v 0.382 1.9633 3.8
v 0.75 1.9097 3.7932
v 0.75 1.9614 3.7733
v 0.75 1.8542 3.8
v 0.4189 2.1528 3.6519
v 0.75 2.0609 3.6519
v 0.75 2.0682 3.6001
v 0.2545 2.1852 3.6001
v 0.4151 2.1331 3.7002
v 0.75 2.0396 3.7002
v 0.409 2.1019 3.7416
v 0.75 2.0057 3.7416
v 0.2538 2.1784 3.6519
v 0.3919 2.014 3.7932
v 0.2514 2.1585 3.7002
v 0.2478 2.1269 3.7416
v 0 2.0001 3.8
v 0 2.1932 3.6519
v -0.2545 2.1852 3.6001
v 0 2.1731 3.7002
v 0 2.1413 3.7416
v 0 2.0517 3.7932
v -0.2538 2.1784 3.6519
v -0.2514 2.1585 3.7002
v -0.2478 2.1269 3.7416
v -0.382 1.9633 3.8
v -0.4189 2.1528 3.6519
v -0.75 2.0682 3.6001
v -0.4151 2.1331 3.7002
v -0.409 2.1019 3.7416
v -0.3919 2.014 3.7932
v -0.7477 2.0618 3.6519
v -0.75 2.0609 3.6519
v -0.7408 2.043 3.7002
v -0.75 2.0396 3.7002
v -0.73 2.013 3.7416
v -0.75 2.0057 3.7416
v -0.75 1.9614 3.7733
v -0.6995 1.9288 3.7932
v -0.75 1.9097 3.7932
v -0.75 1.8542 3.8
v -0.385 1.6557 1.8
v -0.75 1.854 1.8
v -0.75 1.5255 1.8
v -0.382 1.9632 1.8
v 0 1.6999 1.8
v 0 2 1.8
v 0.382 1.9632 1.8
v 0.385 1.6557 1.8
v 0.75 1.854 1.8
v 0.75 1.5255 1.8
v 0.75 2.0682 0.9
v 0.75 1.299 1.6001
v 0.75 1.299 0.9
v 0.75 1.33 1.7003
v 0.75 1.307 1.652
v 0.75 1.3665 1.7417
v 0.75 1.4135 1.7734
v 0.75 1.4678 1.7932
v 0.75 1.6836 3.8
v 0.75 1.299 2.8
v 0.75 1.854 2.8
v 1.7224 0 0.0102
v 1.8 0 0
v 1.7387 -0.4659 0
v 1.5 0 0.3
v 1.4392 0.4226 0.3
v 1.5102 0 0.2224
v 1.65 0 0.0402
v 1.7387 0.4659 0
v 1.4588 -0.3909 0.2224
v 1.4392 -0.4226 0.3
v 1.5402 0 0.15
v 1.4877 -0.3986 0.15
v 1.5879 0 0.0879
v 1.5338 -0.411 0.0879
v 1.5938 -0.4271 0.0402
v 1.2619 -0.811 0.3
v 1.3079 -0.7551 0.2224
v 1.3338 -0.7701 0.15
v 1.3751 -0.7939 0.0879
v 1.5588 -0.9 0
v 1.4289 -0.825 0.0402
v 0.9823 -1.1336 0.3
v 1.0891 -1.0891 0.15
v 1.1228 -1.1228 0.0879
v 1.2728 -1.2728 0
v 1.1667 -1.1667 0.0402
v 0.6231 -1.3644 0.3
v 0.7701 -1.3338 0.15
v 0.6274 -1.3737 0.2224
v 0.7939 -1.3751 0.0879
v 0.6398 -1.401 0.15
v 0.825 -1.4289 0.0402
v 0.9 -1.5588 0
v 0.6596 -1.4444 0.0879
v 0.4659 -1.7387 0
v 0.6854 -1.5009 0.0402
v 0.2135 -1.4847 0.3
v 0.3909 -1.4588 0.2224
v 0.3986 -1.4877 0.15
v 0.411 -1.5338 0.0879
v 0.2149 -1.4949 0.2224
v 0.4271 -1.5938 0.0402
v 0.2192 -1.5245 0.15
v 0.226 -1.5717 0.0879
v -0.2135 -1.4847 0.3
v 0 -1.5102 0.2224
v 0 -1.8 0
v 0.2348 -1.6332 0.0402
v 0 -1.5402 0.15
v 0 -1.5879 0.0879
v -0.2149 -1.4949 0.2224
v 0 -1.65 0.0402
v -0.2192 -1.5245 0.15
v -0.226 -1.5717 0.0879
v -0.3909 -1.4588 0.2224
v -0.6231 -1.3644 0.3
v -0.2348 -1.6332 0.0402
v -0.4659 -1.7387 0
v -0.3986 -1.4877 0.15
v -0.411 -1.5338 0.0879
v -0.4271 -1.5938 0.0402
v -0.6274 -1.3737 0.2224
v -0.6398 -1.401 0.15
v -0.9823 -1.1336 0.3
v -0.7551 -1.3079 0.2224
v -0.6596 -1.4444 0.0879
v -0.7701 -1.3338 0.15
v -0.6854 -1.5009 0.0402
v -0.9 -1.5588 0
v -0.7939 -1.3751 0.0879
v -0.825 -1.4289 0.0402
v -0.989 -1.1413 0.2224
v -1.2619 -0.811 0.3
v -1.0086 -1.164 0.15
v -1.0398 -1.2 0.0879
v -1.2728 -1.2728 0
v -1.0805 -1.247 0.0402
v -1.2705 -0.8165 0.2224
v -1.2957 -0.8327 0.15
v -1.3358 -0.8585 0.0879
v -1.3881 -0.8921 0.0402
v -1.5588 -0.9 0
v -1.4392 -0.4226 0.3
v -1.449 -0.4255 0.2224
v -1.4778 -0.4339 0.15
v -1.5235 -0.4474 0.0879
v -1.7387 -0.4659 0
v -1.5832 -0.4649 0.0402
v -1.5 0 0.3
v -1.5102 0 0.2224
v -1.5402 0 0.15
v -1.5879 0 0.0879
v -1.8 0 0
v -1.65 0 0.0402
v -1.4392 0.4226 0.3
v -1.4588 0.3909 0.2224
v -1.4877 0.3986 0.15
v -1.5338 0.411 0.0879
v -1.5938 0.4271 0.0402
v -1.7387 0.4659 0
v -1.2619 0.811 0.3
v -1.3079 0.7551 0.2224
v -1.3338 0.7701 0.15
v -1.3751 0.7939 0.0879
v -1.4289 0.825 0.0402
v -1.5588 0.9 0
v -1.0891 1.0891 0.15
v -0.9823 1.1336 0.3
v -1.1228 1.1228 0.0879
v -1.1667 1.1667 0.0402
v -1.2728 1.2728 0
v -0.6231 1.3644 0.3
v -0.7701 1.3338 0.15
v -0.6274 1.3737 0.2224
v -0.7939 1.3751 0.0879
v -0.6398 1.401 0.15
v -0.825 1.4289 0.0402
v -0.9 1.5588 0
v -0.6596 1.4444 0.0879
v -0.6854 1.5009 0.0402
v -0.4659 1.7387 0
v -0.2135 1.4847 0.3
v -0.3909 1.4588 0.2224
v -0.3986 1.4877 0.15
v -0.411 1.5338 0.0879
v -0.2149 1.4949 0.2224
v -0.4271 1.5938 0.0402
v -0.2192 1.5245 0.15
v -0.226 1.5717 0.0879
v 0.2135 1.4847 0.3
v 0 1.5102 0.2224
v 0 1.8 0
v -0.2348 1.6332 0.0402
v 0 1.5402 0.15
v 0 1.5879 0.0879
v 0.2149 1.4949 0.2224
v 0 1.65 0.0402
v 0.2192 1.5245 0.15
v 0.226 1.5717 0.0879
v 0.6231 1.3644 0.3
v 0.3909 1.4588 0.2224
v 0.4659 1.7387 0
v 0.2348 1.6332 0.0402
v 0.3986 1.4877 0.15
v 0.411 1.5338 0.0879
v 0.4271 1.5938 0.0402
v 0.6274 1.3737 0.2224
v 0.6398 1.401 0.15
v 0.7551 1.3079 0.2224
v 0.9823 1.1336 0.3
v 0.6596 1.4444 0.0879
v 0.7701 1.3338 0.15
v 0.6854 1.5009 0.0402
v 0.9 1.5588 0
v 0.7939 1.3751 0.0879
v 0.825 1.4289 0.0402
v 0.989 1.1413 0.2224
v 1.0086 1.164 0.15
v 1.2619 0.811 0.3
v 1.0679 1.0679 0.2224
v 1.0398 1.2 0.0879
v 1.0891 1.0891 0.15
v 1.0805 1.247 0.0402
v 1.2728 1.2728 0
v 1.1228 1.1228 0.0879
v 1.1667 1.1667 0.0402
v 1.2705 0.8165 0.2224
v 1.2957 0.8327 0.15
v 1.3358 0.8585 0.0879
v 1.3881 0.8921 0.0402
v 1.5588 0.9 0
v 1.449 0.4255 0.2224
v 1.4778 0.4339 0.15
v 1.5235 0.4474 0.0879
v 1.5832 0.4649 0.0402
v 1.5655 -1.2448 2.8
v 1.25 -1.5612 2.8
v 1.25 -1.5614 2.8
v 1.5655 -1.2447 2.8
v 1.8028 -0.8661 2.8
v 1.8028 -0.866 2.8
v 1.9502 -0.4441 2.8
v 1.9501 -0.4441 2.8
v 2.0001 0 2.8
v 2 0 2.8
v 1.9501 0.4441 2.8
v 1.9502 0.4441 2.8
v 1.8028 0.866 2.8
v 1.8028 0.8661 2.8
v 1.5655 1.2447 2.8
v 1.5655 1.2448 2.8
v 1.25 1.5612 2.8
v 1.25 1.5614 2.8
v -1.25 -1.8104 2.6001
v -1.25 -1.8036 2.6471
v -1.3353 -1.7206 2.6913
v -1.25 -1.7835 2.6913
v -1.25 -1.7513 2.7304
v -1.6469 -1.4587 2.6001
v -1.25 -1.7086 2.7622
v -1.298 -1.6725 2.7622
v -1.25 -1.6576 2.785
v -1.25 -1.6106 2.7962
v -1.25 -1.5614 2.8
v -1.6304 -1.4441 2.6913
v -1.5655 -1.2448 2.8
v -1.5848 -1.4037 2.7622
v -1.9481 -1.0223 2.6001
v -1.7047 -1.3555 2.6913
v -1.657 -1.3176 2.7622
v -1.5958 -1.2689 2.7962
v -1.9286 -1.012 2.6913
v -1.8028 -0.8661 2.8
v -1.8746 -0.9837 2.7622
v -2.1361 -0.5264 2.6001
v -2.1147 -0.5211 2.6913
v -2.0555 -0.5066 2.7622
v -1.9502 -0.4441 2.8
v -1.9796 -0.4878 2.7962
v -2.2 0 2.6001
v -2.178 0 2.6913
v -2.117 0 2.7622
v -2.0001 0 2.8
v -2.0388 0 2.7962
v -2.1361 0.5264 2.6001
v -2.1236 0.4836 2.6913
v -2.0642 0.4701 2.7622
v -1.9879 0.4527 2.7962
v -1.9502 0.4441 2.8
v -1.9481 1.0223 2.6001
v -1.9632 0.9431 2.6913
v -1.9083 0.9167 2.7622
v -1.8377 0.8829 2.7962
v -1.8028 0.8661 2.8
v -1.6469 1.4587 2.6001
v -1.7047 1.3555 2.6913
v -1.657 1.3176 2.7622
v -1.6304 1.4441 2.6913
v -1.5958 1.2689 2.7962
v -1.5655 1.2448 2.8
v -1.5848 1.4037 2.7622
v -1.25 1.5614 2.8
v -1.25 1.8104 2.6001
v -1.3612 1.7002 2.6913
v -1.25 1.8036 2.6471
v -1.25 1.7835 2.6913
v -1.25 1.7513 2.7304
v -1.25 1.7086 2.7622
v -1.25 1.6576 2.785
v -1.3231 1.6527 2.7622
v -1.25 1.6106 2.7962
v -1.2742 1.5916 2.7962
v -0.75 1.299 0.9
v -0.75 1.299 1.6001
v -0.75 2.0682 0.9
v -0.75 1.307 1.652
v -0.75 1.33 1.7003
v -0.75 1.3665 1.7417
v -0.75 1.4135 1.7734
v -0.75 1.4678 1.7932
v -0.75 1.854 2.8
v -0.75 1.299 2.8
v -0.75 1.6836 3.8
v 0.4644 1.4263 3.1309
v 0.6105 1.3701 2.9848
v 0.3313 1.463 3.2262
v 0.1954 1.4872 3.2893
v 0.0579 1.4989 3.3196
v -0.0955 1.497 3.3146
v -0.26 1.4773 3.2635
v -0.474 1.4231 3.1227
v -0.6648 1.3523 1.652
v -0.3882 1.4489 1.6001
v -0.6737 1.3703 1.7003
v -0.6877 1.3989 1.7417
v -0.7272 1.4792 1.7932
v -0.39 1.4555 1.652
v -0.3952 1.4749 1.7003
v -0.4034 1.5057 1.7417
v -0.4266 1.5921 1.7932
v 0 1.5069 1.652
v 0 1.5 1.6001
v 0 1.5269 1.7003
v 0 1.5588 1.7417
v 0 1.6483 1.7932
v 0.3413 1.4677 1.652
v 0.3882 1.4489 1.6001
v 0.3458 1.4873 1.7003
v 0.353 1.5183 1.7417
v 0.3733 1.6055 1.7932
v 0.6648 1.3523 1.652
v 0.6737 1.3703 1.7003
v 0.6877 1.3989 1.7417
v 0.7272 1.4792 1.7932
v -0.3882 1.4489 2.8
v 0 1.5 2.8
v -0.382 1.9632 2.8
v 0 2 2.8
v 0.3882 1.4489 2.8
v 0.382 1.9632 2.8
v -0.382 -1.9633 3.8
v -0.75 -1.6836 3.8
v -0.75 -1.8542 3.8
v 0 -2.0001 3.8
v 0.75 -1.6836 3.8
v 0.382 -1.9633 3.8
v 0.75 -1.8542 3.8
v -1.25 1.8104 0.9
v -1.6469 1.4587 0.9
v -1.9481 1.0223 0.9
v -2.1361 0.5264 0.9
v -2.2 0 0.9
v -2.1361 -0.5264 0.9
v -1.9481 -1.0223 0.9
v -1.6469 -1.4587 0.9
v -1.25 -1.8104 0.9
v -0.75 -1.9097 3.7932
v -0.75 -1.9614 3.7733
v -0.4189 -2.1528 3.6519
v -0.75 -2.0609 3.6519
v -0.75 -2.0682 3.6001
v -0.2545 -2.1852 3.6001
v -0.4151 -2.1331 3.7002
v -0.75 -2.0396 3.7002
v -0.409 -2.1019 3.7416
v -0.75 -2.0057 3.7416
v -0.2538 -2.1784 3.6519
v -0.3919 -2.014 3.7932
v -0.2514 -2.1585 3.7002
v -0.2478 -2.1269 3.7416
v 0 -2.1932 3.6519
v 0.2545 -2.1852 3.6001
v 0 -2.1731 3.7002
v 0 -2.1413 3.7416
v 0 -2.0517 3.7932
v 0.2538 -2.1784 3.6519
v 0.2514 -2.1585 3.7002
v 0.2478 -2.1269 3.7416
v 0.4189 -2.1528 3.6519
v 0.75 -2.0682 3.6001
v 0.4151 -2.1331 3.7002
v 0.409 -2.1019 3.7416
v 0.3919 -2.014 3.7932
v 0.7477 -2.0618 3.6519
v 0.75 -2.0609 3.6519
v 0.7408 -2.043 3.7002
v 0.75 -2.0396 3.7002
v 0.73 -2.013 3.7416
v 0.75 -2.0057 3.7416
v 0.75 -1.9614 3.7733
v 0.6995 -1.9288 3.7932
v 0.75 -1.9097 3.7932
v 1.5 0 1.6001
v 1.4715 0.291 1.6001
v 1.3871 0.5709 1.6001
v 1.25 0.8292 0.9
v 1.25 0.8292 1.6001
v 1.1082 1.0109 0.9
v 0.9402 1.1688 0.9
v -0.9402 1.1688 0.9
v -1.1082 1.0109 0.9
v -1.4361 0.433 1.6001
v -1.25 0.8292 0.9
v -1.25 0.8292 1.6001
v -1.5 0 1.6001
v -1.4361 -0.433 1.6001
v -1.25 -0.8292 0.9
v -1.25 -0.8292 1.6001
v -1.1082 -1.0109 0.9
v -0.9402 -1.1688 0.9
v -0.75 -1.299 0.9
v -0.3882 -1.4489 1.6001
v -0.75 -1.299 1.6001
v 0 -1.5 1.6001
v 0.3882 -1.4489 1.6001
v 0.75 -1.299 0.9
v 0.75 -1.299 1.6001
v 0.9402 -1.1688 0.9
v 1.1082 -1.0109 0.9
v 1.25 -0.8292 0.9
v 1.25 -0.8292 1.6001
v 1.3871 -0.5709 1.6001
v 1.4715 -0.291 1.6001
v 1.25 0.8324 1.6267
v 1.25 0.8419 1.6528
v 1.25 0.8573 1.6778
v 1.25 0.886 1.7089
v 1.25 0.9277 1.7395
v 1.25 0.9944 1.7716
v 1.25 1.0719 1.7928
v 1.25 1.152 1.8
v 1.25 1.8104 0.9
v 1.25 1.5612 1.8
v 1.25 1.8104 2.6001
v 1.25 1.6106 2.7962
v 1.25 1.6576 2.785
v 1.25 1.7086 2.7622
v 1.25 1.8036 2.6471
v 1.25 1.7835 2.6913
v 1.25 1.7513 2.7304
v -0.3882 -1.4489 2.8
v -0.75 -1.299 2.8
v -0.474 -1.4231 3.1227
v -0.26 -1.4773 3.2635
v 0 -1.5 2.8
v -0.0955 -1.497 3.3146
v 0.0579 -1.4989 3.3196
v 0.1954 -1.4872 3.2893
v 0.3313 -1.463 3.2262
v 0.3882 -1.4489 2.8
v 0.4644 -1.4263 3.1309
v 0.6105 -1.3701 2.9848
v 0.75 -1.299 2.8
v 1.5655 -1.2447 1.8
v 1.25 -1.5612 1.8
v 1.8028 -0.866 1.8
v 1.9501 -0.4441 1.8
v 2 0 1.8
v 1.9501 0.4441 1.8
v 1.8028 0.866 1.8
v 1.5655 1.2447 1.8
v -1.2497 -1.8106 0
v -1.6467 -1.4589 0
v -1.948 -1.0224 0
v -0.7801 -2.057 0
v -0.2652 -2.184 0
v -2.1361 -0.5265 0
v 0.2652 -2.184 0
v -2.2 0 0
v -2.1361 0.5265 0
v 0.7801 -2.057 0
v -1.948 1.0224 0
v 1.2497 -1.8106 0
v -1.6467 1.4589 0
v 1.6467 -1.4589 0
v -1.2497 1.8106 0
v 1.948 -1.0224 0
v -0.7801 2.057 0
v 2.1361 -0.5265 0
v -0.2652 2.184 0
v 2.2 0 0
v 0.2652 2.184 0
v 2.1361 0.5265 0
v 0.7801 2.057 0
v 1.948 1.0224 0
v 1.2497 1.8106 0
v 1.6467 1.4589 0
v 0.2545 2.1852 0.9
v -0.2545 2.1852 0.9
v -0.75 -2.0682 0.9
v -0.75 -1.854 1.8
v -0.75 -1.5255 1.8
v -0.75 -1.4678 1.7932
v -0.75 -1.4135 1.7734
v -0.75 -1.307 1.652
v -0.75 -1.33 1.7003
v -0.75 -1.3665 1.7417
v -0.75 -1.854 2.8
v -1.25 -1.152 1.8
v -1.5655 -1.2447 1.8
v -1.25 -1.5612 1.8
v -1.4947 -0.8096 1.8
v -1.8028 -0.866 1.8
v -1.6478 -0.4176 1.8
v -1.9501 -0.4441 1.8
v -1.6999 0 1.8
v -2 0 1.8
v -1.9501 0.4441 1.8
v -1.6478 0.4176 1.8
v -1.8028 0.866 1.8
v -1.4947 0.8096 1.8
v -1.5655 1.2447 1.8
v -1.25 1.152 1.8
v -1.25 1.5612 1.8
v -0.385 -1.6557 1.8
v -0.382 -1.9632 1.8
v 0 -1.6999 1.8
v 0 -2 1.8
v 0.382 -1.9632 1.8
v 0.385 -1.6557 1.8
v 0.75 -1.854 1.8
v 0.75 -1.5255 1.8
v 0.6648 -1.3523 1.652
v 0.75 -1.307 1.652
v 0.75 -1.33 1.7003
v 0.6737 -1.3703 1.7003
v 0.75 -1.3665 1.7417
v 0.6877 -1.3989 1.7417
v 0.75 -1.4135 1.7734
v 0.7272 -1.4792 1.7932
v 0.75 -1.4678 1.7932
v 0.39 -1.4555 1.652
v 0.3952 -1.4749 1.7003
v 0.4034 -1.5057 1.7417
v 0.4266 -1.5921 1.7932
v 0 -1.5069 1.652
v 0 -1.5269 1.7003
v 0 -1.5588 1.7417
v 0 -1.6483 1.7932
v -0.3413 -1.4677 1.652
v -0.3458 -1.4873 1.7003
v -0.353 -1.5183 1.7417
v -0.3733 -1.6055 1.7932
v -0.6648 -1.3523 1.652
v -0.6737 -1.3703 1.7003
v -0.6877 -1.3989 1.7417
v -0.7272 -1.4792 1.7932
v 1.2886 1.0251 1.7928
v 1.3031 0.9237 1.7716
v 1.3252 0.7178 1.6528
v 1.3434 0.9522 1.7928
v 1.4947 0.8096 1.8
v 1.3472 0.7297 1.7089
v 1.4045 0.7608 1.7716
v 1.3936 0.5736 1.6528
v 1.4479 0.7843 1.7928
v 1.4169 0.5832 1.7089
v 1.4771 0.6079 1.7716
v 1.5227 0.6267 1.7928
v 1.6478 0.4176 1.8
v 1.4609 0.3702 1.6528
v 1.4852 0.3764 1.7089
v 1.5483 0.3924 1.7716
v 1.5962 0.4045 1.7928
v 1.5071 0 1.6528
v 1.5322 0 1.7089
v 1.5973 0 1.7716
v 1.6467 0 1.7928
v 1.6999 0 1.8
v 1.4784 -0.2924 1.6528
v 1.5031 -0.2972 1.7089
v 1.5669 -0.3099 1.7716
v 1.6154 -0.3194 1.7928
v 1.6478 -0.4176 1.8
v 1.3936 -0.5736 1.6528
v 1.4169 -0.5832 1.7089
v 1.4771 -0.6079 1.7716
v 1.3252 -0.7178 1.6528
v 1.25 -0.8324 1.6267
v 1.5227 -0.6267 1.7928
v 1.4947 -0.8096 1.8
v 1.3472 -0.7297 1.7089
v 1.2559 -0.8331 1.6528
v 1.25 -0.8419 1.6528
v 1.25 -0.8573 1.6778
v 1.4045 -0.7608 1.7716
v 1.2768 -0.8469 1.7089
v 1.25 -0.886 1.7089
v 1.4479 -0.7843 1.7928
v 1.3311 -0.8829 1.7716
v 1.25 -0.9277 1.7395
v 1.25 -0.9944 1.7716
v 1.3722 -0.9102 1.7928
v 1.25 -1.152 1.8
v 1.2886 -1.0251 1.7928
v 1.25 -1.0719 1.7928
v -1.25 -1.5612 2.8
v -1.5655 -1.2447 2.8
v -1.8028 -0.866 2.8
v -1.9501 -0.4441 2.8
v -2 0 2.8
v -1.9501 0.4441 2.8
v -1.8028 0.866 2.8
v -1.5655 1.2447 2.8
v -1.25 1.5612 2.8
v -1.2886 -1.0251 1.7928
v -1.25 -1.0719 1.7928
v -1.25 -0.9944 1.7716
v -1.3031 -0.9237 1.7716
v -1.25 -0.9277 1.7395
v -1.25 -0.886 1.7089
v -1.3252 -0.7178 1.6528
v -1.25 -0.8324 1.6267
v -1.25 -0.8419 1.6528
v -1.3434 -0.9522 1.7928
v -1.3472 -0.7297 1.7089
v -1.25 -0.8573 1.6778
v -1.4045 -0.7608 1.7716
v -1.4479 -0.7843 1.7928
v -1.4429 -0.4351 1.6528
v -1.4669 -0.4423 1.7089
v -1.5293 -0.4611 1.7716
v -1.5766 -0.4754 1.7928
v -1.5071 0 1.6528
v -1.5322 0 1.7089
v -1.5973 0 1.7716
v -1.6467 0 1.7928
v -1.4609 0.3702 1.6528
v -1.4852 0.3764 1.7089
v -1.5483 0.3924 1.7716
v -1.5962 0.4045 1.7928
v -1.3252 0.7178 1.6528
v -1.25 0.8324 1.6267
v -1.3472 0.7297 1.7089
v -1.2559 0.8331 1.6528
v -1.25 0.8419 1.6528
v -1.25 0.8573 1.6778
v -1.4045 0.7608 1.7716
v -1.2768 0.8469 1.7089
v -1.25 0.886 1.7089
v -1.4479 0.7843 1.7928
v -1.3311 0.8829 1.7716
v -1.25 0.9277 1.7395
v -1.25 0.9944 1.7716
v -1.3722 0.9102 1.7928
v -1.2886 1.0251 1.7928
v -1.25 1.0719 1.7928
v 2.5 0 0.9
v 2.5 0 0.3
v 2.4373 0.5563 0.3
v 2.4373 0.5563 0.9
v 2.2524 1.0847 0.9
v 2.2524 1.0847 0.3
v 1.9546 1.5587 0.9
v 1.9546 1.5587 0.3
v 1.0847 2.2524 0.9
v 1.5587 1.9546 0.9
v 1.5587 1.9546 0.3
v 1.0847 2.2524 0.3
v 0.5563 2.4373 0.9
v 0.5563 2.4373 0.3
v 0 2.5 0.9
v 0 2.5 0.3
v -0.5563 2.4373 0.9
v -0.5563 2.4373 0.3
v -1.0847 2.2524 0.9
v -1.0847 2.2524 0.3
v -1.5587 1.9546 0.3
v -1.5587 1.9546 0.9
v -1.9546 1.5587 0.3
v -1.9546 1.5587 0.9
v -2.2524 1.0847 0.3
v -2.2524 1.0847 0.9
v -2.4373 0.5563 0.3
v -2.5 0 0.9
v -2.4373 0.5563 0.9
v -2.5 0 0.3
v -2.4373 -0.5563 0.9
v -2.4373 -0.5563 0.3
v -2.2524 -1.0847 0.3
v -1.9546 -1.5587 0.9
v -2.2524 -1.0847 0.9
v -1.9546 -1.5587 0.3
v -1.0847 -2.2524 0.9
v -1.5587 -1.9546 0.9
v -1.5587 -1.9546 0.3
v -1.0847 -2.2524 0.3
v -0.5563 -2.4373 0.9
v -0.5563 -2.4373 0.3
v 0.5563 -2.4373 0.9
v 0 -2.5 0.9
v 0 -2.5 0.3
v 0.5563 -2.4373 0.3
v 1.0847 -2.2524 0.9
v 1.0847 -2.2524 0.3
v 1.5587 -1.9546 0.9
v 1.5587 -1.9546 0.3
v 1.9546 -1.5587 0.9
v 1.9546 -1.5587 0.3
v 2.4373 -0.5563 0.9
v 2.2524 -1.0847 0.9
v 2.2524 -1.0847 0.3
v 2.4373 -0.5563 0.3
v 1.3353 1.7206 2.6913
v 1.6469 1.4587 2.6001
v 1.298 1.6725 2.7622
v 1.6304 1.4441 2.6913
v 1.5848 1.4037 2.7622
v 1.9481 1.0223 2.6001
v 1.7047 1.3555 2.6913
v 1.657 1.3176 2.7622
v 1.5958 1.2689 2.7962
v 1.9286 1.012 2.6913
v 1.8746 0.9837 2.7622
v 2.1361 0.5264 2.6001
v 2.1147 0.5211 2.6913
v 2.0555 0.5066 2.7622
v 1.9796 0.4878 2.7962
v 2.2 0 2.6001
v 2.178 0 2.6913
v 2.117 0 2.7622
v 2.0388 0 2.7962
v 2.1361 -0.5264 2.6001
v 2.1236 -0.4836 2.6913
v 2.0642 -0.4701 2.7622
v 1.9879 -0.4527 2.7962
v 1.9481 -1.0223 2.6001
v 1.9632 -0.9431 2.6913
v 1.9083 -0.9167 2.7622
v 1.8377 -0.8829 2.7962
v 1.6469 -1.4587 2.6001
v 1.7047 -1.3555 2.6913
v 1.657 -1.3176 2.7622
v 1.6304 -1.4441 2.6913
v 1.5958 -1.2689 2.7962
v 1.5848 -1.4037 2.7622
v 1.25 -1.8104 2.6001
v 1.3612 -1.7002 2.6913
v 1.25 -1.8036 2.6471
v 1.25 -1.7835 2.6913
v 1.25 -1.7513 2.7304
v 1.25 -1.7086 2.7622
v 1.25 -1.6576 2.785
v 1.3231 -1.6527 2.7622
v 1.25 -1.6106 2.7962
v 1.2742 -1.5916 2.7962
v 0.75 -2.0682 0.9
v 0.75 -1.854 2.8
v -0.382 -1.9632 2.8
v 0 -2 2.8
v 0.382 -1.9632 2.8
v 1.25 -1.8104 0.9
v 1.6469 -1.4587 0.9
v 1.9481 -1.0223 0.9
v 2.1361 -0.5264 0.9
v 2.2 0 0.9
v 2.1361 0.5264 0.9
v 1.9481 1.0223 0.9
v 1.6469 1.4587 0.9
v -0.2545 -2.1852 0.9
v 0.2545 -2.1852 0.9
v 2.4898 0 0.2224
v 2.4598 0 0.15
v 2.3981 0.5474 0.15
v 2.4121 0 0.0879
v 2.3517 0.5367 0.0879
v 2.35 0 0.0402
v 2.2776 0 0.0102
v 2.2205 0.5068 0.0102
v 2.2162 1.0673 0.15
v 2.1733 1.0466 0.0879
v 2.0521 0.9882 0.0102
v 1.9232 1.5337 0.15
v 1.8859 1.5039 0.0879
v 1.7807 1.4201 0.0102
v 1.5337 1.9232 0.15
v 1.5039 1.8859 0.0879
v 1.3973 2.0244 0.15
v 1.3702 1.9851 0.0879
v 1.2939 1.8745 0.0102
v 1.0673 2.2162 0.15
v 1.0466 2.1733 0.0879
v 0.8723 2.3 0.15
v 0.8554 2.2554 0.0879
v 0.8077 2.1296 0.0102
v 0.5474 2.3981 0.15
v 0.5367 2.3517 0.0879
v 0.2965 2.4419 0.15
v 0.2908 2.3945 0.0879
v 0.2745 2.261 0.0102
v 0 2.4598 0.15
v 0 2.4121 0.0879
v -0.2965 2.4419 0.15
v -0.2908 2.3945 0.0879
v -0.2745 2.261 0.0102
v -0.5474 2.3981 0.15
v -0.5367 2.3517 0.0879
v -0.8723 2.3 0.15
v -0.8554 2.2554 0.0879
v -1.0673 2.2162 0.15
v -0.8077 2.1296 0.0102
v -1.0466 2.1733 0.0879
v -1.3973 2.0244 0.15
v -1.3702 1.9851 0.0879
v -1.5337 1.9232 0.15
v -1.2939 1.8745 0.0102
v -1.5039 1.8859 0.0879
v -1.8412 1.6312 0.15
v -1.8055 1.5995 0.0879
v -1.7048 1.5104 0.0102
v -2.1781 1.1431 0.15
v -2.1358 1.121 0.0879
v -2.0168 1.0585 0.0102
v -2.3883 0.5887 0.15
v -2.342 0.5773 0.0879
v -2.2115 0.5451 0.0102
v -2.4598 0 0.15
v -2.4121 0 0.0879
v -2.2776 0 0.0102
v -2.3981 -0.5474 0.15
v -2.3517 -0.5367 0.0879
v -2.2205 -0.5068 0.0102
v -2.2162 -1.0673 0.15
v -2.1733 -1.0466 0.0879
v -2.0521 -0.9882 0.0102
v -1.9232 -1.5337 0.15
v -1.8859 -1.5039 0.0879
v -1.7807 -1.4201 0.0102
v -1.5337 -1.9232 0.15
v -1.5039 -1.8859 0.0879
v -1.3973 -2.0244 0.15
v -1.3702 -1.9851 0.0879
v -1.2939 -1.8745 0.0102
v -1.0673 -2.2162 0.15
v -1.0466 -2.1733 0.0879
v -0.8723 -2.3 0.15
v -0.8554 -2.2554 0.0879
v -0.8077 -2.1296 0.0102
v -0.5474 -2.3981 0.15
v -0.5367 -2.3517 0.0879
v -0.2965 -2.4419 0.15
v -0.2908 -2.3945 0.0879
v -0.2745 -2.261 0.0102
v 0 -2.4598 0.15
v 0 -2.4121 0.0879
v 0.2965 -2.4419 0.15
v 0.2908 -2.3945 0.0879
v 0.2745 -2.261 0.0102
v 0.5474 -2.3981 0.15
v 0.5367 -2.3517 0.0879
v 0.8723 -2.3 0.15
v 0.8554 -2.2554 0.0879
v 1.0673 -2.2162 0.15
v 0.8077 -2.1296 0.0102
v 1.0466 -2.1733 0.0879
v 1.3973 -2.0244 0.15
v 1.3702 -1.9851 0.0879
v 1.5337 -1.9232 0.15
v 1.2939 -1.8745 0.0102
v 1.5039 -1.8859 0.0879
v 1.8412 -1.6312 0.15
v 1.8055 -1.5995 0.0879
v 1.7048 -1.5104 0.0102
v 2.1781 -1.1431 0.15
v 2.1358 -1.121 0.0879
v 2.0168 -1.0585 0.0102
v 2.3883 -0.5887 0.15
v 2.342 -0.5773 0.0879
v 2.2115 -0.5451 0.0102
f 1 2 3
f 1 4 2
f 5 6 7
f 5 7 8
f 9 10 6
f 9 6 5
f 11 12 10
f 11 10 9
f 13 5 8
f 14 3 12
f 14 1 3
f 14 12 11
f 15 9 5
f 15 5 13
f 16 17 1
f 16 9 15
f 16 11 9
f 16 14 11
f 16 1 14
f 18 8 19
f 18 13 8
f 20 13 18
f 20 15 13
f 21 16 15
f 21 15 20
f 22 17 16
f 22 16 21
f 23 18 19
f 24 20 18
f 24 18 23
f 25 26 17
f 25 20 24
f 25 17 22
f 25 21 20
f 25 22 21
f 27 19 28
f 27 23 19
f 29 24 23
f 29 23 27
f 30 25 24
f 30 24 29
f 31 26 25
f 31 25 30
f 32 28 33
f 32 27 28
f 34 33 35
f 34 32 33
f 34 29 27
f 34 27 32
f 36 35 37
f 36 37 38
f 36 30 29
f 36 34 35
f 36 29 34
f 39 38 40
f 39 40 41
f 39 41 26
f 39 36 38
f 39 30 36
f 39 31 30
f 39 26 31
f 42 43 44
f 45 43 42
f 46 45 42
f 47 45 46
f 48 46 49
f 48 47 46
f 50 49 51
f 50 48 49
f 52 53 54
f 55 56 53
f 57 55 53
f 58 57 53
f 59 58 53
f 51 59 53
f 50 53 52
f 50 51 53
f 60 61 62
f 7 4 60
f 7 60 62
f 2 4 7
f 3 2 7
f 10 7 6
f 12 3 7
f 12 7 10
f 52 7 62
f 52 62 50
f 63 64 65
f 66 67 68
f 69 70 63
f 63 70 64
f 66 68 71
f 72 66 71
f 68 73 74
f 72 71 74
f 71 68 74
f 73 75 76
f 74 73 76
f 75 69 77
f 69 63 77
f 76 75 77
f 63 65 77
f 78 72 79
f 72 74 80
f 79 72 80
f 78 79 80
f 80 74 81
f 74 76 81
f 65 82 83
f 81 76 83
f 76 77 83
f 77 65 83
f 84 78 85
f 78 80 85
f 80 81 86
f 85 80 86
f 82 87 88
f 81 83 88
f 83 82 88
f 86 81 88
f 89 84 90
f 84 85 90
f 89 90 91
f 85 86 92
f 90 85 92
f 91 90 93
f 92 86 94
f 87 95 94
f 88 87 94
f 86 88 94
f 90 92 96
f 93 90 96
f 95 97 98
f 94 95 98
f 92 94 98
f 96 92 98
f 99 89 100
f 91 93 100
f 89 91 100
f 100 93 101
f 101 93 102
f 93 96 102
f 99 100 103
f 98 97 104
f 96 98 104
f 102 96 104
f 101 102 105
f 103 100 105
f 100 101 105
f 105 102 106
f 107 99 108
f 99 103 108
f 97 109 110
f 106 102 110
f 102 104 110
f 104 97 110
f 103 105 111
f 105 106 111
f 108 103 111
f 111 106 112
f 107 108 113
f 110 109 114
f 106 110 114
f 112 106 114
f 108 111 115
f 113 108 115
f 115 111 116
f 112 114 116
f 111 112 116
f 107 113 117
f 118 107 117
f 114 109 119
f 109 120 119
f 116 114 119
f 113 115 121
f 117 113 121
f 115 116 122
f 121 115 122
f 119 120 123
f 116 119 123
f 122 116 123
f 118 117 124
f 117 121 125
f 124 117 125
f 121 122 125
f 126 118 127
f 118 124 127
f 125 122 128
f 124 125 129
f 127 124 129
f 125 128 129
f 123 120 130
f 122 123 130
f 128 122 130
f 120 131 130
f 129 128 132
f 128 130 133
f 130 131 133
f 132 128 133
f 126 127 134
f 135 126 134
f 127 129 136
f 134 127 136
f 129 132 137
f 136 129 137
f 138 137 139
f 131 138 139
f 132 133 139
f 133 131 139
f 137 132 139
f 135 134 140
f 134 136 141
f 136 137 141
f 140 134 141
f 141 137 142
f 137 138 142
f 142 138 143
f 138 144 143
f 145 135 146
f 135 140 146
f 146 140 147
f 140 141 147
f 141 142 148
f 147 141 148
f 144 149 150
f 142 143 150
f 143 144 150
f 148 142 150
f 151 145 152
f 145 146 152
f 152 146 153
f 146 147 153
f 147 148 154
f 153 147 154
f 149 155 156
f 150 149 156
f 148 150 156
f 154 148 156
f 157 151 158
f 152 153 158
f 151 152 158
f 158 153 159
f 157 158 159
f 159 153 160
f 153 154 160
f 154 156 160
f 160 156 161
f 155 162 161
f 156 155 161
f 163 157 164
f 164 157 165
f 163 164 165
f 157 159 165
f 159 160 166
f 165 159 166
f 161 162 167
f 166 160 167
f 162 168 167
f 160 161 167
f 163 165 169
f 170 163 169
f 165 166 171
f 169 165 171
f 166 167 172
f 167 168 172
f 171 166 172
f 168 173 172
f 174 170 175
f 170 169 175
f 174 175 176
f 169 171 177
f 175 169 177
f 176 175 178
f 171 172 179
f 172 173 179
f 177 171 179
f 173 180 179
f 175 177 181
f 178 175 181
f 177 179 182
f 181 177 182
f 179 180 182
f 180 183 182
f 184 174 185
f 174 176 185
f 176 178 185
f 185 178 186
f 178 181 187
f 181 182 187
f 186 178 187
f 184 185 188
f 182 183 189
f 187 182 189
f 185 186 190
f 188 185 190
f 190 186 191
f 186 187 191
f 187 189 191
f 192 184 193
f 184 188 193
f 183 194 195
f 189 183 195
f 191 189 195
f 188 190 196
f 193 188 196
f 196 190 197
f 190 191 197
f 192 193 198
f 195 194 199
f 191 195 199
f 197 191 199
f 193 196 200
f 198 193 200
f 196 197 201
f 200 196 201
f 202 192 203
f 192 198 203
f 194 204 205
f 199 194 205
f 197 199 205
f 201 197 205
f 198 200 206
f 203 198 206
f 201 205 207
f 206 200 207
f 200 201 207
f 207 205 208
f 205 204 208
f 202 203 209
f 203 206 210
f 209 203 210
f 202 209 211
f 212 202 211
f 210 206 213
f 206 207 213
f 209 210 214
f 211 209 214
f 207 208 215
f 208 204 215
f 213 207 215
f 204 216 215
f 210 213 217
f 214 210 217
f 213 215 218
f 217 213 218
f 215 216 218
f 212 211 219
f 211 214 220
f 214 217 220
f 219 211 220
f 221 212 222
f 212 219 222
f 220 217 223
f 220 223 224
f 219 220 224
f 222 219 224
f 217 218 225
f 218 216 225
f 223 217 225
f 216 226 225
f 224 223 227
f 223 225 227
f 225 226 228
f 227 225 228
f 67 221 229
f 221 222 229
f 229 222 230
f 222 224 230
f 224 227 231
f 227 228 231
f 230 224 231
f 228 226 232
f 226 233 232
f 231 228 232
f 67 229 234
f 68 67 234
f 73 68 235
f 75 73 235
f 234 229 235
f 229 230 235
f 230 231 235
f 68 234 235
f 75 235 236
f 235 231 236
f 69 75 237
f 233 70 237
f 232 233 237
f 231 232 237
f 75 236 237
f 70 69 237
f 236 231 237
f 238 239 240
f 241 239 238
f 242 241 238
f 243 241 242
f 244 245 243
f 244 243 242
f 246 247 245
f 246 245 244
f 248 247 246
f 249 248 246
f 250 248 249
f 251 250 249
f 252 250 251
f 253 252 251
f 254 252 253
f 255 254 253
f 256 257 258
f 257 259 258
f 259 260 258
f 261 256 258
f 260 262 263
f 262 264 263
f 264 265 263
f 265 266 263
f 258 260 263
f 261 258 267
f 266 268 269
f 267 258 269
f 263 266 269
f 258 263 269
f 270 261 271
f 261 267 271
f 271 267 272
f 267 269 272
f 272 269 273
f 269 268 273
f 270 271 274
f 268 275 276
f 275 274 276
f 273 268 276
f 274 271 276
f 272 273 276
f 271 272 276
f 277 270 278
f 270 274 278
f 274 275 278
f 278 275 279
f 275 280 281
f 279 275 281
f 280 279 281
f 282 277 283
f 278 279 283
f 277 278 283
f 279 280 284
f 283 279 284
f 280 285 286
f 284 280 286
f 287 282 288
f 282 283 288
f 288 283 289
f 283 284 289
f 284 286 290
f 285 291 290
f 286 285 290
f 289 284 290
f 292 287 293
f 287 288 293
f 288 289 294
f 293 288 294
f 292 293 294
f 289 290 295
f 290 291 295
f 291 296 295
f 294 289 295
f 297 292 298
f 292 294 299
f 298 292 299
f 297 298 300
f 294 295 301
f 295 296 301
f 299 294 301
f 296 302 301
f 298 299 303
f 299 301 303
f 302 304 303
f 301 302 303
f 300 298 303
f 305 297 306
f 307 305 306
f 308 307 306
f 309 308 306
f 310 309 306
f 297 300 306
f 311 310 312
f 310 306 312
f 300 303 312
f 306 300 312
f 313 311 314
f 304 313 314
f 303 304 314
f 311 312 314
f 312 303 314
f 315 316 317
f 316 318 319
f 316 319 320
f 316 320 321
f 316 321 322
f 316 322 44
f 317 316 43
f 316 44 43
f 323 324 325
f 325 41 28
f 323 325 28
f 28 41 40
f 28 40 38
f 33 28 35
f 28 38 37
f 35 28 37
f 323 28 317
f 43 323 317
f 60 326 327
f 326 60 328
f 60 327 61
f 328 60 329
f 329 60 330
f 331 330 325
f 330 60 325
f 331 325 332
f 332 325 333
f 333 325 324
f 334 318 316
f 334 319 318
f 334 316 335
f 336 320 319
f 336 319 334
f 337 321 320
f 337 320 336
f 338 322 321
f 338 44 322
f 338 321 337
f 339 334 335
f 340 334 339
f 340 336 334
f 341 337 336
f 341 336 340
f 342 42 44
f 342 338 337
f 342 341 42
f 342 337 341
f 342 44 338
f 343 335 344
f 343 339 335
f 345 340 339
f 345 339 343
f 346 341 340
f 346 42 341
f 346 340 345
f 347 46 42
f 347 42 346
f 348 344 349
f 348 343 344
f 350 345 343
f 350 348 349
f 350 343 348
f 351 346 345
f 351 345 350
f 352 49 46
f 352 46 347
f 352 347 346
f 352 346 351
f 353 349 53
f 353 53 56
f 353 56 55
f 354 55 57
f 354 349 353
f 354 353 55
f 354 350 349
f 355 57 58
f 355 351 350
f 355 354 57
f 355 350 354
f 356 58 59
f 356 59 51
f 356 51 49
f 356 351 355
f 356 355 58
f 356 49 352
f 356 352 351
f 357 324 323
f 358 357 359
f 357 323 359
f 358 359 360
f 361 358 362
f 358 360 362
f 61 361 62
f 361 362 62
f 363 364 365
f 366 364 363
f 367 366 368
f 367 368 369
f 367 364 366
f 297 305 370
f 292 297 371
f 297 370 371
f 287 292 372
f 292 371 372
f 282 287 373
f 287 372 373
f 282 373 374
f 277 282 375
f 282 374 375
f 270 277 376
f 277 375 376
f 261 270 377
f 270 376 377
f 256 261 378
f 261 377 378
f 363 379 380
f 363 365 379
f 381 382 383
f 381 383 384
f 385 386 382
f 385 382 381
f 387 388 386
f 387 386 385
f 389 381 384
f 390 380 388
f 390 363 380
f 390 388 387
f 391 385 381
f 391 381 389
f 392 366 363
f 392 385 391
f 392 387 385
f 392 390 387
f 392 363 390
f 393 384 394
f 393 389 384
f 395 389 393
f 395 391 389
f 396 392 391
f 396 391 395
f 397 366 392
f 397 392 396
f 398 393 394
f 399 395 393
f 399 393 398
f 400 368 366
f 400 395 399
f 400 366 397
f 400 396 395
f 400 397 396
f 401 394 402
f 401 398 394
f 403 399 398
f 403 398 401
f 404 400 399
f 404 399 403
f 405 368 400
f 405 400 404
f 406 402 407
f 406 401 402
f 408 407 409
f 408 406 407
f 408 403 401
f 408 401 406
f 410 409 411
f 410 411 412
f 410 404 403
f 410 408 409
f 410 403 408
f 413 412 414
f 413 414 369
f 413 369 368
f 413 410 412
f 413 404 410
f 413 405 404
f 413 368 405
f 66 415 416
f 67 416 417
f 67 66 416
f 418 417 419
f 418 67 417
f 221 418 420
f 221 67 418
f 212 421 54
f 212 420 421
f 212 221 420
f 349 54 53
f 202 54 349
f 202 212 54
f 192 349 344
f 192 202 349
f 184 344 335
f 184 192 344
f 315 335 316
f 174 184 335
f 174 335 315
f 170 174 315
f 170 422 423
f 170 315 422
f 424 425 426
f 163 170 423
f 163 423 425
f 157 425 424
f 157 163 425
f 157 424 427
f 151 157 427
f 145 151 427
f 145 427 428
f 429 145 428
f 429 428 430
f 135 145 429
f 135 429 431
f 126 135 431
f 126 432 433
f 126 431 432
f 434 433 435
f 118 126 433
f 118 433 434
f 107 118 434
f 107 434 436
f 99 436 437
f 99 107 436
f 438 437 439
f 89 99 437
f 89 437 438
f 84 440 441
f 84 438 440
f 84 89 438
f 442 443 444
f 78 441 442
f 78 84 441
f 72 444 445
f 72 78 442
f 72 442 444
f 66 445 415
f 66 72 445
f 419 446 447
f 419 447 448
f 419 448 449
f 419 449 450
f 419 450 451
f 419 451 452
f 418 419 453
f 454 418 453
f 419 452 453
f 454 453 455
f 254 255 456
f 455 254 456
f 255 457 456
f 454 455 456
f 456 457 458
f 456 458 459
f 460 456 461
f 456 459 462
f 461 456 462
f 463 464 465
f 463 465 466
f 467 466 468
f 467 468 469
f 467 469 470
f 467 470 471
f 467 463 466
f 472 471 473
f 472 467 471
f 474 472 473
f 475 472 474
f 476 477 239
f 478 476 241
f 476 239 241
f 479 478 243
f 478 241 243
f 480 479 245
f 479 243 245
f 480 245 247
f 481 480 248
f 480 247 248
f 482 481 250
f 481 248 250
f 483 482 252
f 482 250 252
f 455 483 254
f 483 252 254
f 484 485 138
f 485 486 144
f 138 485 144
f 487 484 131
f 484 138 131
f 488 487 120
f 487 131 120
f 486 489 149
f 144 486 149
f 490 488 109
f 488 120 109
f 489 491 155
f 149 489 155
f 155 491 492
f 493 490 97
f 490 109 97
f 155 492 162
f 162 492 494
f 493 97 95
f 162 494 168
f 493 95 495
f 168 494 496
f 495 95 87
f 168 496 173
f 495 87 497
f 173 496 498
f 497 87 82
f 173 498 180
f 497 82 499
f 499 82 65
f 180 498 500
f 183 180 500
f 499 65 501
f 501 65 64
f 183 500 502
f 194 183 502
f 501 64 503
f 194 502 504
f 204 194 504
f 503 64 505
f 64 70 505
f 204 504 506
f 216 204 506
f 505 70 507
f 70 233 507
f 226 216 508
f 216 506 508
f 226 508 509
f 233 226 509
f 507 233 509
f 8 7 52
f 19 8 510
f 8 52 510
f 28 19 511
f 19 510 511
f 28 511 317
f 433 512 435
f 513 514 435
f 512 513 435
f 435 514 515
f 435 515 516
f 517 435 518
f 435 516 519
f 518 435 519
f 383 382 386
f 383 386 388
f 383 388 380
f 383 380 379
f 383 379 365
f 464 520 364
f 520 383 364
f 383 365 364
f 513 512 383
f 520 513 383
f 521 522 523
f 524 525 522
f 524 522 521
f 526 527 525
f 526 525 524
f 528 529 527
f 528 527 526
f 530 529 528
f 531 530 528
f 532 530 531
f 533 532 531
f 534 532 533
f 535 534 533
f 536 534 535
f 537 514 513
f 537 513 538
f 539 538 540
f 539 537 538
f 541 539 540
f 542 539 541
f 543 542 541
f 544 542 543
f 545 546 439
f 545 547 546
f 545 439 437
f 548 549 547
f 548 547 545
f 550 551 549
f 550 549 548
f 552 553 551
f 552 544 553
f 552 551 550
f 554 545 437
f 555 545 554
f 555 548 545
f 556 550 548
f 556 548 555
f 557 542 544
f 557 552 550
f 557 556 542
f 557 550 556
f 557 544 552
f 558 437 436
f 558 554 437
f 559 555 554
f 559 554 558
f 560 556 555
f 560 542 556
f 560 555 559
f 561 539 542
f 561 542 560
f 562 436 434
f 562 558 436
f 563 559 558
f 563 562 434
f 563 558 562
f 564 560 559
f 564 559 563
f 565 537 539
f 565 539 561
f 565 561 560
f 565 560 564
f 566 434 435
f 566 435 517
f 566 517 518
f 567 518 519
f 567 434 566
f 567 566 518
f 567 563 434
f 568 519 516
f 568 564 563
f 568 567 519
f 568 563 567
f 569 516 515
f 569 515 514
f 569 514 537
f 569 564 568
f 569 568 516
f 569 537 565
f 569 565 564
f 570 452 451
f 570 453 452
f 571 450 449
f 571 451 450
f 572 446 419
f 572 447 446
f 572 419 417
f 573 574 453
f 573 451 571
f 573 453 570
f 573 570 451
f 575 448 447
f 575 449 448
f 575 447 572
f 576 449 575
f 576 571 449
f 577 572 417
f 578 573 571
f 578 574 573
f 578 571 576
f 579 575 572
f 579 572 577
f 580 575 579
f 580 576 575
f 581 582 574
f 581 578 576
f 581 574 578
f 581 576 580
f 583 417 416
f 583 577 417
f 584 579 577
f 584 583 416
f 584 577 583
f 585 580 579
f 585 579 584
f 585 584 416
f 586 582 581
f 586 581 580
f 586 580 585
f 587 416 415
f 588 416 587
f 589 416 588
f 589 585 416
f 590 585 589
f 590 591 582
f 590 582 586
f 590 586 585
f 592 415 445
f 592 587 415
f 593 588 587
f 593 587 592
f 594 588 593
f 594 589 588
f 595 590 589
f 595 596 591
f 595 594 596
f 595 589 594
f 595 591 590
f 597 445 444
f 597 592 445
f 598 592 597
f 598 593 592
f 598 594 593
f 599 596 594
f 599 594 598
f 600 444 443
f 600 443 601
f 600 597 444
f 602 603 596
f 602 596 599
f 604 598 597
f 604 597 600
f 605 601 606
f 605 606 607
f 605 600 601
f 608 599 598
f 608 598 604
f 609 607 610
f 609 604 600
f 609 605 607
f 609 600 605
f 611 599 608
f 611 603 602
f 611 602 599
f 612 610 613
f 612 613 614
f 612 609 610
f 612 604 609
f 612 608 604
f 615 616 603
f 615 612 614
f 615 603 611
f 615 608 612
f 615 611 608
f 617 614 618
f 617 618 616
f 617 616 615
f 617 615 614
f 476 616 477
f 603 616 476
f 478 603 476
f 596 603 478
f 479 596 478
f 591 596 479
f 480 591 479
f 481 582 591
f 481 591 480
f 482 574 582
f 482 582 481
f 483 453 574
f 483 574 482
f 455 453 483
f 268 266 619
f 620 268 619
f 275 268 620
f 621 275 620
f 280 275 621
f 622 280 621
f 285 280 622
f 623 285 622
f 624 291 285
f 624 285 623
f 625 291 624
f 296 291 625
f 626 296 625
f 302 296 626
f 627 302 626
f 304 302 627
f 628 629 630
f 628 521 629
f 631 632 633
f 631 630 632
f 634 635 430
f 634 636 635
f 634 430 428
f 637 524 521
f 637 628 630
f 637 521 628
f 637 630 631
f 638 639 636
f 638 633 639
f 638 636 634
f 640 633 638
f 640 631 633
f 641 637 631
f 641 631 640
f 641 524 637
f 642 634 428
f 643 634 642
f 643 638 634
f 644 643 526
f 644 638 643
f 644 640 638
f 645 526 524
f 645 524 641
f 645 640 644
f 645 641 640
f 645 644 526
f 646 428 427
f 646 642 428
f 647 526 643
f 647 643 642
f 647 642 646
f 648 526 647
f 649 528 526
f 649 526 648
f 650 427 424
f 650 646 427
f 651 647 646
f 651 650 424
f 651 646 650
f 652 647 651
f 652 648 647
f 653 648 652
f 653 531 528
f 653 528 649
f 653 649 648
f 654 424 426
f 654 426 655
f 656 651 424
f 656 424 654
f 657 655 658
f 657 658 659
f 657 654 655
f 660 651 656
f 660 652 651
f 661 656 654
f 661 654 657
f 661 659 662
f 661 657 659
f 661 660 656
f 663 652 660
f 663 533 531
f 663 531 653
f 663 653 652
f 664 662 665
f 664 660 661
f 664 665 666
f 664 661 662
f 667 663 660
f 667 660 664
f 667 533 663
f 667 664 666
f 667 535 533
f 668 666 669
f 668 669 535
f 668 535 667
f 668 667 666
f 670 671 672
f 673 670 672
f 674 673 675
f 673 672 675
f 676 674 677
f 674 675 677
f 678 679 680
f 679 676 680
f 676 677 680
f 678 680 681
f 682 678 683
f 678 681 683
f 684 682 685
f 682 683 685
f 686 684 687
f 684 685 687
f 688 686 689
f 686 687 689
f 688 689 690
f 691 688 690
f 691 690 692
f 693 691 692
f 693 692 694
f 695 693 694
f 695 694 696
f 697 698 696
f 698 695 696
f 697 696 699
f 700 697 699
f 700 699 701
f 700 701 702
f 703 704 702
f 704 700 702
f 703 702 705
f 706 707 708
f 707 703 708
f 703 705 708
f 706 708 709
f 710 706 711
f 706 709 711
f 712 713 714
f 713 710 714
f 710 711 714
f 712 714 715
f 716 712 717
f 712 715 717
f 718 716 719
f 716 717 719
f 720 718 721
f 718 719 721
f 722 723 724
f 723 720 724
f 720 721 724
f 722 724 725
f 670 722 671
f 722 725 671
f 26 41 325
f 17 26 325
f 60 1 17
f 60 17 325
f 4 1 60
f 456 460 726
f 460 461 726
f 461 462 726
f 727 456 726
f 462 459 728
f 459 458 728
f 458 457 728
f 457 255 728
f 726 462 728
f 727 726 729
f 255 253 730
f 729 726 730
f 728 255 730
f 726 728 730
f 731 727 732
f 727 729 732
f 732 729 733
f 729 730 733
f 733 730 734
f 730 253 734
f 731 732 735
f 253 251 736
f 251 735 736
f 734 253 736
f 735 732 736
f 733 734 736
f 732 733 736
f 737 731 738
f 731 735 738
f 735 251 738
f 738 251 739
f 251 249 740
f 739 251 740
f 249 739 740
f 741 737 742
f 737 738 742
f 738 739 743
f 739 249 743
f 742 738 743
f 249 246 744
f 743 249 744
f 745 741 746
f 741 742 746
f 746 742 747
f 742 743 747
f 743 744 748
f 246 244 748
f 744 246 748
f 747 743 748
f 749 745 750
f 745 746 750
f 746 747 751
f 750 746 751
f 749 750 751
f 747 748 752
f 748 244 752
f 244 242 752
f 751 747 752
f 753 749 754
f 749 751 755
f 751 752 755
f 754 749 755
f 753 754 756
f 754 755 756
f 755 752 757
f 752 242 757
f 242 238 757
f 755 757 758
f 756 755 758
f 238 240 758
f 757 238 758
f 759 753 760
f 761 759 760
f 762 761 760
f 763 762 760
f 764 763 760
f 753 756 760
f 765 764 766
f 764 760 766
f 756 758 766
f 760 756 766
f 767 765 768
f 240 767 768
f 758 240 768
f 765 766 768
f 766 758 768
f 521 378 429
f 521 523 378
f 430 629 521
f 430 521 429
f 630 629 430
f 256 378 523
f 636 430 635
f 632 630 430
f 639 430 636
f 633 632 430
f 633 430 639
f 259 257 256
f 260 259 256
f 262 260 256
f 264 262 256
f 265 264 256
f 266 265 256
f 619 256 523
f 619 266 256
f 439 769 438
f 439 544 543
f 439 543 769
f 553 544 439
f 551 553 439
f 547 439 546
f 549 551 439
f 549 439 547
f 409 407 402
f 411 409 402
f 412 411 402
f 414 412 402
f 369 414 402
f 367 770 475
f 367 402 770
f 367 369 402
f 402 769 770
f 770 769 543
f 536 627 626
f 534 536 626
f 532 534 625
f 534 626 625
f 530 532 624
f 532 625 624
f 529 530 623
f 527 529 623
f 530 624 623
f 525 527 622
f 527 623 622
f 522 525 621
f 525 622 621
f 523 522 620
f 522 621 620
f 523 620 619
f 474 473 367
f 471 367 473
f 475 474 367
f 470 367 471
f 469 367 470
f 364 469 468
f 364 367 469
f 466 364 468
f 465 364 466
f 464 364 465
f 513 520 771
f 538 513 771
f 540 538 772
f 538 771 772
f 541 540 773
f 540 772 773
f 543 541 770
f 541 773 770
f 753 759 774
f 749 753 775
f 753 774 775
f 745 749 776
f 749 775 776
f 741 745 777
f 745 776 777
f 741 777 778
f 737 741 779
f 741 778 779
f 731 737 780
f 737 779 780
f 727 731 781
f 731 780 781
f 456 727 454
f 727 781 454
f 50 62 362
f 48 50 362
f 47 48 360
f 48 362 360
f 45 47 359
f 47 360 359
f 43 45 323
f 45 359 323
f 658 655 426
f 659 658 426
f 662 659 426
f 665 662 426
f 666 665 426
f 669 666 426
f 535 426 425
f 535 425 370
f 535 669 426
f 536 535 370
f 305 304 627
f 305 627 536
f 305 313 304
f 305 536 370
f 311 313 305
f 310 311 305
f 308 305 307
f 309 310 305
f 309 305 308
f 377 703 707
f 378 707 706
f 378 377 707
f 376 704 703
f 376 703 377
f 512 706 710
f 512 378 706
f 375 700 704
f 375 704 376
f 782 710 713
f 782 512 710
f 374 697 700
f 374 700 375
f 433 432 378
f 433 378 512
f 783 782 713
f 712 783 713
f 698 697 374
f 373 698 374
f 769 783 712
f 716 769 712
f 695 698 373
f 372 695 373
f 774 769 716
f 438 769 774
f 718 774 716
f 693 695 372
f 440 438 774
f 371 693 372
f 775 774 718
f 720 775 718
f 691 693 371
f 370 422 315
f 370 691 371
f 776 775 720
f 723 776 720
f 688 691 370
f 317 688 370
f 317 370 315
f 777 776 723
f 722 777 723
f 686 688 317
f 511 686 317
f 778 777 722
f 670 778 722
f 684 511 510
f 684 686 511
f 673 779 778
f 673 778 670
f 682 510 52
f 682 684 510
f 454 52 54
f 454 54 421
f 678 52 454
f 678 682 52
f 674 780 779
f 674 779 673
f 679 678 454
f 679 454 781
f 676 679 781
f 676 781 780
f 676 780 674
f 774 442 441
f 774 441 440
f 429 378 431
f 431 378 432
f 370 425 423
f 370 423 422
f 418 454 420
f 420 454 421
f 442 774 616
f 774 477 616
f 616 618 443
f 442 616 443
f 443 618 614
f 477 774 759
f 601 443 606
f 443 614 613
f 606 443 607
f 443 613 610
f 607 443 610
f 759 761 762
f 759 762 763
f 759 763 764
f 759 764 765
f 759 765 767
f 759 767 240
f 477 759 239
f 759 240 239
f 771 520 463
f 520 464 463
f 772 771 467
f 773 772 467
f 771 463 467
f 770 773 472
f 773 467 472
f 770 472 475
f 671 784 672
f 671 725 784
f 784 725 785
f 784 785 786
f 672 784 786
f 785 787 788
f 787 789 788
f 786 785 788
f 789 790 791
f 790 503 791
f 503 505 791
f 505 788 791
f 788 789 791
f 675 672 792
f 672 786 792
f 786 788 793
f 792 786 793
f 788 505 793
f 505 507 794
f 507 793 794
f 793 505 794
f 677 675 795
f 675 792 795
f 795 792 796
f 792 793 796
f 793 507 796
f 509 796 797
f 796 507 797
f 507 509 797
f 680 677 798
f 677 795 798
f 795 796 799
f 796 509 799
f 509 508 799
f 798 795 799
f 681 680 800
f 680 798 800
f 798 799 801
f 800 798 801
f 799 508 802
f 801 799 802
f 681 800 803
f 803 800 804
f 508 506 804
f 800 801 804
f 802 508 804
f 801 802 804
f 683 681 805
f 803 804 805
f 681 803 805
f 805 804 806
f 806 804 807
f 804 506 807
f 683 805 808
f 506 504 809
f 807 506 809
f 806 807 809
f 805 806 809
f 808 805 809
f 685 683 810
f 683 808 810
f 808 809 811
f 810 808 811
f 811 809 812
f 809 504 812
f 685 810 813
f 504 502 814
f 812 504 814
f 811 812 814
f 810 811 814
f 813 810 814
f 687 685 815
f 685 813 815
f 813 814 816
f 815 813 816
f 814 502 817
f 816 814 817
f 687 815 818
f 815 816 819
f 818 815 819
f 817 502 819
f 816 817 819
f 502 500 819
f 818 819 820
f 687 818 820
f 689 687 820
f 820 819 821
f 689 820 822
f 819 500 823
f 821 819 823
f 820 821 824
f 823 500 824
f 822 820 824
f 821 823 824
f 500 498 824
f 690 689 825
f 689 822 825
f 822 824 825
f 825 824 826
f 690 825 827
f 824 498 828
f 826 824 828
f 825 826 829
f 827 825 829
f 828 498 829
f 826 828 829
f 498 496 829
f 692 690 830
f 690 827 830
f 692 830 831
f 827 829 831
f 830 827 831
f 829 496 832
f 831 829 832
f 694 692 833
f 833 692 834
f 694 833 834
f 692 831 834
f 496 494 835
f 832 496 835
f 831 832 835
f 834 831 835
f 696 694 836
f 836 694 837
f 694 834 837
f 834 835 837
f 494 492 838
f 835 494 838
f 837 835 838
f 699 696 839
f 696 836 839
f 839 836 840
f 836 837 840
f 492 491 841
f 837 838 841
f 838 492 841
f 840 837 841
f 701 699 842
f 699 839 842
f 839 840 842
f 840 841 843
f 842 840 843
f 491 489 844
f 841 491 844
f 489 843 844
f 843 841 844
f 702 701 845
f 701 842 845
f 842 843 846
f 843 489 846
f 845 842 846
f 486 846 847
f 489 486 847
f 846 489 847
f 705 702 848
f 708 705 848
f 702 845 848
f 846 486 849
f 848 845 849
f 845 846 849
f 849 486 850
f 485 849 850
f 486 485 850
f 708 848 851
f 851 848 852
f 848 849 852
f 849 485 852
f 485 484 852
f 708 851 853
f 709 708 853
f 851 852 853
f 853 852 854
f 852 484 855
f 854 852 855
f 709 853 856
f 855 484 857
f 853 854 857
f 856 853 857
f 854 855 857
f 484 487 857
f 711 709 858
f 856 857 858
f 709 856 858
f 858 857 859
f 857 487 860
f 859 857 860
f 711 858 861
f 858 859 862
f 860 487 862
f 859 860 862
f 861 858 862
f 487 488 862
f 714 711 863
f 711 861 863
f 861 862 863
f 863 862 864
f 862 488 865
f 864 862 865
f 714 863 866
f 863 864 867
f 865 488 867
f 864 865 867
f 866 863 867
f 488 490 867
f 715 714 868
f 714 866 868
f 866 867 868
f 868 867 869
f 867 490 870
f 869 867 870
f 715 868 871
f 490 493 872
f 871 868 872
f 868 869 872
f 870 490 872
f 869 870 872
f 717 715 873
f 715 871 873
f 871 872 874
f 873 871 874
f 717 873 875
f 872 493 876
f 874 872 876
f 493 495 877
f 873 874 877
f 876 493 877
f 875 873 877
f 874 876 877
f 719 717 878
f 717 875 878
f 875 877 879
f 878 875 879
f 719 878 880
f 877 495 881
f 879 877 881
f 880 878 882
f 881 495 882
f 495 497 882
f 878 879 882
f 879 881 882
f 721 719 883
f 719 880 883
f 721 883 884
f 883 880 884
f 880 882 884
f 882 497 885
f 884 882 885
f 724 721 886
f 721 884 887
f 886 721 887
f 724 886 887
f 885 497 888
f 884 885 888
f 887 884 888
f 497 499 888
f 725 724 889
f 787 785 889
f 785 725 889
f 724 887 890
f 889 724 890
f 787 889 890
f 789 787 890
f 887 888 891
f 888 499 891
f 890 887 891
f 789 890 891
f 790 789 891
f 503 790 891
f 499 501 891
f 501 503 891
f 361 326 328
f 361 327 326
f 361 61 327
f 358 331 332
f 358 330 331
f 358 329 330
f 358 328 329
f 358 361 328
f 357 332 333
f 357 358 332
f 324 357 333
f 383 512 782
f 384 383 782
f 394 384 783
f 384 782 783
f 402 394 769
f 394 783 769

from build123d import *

# Parameters (mm, degrees)
SKETCH_1_R               = 2.5
EXTRUDE_1_DEPTH          = 0.9
SKETCH_2_R               = 2.2
EXTRUDE_2_DEPTH          = 2.9
CUT_EXTRUDE_1_DEPTH      = 6.190375709
CUT_EXTRUDE_1_DEPTH_BACK = 6.190375709
SKETCH_3_R               = 1.5
SKETCH_4_W               = 0.5
SKETCH_4_H               = 8
CUT_EXTRUDE_2_DEPTH      = 2.9
SKETCH_5_W               = 2
SKETCH_5_H               = 6
CUT_EXTRUDE_3_DEPTH      = 1
SKETCH_6_R               = 2
CUT_EXTRUDE_4_DEPTH      = 1
CUT_EXTRUDE_5_DEPTH      = 6.590393546
FILLET_1_R               = 0.3
FILLET_2_R               = 0.2


with BuildPart() as part:
    # Эскиз1 → Бобышка-Вытянуть1 (new body)
    with BuildSketch(Plane.XY):
        Circle(SKETCH_1_R)
    extrude(amount=EXTRUDE_1_DEPTH)

    # Эскиз2 → Бобышка-Вытянуть2 (add)
    with BuildSketch(Plane.XY.offset(0.9)):
        Circle(SKETCH_2_R)
    extrude(amount=EXTRUDE_2_DEPTH)

    # Эскиз3 → Вырез-Вытянуть1 (cut, two sides: drawn at the far end of the back side and taken through both)
    with BuildSketch(Plane.XY.offset(3.8).offset(-CUT_EXTRUDE_1_DEPTH_BACK)):
        Circle(SKETCH_3_R)
    extrude(amount=CUT_EXTRUDE_1_DEPTH + CUT_EXTRUDE_1_DEPTH_BACK, mode=Mode.SUBTRACT)

    # Эскиз4 → Вырез-Вытянуть2 (cut)
    with BuildSketch(Plane.XY.offset(3.8)):
        with Locations((-1, 0)):
            Rectangle(SKETCH_4_W, SKETCH_4_H)
        with Locations((1, 0)):
            Rectangle(SKETCH_4_W, SKETCH_4_H)
    extrude(amount=-CUT_EXTRUDE_2_DEPTH, mode=Mode.SUBTRACT)

    # Эскиз5 → Вырез-Вытянуть3 (cut)
    with BuildSketch(Plane.XY.offset(3.8)):
        with Locations((-2.25, -1.189613301)):
            Rectangle(SKETCH_5_W, SKETCH_5_H)
        with Locations((2.25, -1.189613301)):
            Rectangle(SKETCH_5_W, SKETCH_5_H)
    extrude(amount=-CUT_EXTRUDE_3_DEPTH, mode=Mode.SUBTRACT)

    # Эскиз6 → Вырез-Вытянуть4 (cut)
    with BuildSketch(Plane.XY.offset(2.8)):
        Circle(SKETCH_6_R)
    extrude(amount=-CUT_EXTRUDE_4_DEPTH, mode=Mode.SUBTRACT)

    # Эскиз7 → Вырез-Вытянуть5 (cut, through all)
    with BuildSketch(Plane.ZY.offset(0.75)):
        Polygon((3.8, 1.683624947), (2.8, 1.299038106), (3.8, 1.299038106), align=None)
        Polygon((3.8, -1.683624947), (2.8, -1.299038106), (3.8, -1.299038106), align=None)
    extrude(amount=-CUT_EXTRUDE_5_DEPTH, mode=Mode.SUBTRACT)

    # Скругление1
    fillet_1_edges = [part.edges().sort_by_distance(p)[0] for p in [
        (-1.5, 0, 0),
        (-2.5, 0, 0),
    ]]
    fillet(fillet_1_edges, radius=FILLET_1_R)

    # Скругление2
    fillet_2_edges = [part.edges().sort_by_distance(p)[0] for p in [
        (1.436140662, 0.433012702, 1.8),
        (0, -1.5, 1.8),
        (0, 1.5, 1.8),
        (-1.5, 0, 1.8),
        (0, 2.2, 3.8),
        (0, -2.2, 3.8),
        (2.2, 0, 2.8),
        (-2.2, 0, 2.8),
    ]]
    fillet(fillet_2_edges, radius=FILLET_2_R - 0.0001)  # a hair under: the kernel refuses the full size


solid = part.part
